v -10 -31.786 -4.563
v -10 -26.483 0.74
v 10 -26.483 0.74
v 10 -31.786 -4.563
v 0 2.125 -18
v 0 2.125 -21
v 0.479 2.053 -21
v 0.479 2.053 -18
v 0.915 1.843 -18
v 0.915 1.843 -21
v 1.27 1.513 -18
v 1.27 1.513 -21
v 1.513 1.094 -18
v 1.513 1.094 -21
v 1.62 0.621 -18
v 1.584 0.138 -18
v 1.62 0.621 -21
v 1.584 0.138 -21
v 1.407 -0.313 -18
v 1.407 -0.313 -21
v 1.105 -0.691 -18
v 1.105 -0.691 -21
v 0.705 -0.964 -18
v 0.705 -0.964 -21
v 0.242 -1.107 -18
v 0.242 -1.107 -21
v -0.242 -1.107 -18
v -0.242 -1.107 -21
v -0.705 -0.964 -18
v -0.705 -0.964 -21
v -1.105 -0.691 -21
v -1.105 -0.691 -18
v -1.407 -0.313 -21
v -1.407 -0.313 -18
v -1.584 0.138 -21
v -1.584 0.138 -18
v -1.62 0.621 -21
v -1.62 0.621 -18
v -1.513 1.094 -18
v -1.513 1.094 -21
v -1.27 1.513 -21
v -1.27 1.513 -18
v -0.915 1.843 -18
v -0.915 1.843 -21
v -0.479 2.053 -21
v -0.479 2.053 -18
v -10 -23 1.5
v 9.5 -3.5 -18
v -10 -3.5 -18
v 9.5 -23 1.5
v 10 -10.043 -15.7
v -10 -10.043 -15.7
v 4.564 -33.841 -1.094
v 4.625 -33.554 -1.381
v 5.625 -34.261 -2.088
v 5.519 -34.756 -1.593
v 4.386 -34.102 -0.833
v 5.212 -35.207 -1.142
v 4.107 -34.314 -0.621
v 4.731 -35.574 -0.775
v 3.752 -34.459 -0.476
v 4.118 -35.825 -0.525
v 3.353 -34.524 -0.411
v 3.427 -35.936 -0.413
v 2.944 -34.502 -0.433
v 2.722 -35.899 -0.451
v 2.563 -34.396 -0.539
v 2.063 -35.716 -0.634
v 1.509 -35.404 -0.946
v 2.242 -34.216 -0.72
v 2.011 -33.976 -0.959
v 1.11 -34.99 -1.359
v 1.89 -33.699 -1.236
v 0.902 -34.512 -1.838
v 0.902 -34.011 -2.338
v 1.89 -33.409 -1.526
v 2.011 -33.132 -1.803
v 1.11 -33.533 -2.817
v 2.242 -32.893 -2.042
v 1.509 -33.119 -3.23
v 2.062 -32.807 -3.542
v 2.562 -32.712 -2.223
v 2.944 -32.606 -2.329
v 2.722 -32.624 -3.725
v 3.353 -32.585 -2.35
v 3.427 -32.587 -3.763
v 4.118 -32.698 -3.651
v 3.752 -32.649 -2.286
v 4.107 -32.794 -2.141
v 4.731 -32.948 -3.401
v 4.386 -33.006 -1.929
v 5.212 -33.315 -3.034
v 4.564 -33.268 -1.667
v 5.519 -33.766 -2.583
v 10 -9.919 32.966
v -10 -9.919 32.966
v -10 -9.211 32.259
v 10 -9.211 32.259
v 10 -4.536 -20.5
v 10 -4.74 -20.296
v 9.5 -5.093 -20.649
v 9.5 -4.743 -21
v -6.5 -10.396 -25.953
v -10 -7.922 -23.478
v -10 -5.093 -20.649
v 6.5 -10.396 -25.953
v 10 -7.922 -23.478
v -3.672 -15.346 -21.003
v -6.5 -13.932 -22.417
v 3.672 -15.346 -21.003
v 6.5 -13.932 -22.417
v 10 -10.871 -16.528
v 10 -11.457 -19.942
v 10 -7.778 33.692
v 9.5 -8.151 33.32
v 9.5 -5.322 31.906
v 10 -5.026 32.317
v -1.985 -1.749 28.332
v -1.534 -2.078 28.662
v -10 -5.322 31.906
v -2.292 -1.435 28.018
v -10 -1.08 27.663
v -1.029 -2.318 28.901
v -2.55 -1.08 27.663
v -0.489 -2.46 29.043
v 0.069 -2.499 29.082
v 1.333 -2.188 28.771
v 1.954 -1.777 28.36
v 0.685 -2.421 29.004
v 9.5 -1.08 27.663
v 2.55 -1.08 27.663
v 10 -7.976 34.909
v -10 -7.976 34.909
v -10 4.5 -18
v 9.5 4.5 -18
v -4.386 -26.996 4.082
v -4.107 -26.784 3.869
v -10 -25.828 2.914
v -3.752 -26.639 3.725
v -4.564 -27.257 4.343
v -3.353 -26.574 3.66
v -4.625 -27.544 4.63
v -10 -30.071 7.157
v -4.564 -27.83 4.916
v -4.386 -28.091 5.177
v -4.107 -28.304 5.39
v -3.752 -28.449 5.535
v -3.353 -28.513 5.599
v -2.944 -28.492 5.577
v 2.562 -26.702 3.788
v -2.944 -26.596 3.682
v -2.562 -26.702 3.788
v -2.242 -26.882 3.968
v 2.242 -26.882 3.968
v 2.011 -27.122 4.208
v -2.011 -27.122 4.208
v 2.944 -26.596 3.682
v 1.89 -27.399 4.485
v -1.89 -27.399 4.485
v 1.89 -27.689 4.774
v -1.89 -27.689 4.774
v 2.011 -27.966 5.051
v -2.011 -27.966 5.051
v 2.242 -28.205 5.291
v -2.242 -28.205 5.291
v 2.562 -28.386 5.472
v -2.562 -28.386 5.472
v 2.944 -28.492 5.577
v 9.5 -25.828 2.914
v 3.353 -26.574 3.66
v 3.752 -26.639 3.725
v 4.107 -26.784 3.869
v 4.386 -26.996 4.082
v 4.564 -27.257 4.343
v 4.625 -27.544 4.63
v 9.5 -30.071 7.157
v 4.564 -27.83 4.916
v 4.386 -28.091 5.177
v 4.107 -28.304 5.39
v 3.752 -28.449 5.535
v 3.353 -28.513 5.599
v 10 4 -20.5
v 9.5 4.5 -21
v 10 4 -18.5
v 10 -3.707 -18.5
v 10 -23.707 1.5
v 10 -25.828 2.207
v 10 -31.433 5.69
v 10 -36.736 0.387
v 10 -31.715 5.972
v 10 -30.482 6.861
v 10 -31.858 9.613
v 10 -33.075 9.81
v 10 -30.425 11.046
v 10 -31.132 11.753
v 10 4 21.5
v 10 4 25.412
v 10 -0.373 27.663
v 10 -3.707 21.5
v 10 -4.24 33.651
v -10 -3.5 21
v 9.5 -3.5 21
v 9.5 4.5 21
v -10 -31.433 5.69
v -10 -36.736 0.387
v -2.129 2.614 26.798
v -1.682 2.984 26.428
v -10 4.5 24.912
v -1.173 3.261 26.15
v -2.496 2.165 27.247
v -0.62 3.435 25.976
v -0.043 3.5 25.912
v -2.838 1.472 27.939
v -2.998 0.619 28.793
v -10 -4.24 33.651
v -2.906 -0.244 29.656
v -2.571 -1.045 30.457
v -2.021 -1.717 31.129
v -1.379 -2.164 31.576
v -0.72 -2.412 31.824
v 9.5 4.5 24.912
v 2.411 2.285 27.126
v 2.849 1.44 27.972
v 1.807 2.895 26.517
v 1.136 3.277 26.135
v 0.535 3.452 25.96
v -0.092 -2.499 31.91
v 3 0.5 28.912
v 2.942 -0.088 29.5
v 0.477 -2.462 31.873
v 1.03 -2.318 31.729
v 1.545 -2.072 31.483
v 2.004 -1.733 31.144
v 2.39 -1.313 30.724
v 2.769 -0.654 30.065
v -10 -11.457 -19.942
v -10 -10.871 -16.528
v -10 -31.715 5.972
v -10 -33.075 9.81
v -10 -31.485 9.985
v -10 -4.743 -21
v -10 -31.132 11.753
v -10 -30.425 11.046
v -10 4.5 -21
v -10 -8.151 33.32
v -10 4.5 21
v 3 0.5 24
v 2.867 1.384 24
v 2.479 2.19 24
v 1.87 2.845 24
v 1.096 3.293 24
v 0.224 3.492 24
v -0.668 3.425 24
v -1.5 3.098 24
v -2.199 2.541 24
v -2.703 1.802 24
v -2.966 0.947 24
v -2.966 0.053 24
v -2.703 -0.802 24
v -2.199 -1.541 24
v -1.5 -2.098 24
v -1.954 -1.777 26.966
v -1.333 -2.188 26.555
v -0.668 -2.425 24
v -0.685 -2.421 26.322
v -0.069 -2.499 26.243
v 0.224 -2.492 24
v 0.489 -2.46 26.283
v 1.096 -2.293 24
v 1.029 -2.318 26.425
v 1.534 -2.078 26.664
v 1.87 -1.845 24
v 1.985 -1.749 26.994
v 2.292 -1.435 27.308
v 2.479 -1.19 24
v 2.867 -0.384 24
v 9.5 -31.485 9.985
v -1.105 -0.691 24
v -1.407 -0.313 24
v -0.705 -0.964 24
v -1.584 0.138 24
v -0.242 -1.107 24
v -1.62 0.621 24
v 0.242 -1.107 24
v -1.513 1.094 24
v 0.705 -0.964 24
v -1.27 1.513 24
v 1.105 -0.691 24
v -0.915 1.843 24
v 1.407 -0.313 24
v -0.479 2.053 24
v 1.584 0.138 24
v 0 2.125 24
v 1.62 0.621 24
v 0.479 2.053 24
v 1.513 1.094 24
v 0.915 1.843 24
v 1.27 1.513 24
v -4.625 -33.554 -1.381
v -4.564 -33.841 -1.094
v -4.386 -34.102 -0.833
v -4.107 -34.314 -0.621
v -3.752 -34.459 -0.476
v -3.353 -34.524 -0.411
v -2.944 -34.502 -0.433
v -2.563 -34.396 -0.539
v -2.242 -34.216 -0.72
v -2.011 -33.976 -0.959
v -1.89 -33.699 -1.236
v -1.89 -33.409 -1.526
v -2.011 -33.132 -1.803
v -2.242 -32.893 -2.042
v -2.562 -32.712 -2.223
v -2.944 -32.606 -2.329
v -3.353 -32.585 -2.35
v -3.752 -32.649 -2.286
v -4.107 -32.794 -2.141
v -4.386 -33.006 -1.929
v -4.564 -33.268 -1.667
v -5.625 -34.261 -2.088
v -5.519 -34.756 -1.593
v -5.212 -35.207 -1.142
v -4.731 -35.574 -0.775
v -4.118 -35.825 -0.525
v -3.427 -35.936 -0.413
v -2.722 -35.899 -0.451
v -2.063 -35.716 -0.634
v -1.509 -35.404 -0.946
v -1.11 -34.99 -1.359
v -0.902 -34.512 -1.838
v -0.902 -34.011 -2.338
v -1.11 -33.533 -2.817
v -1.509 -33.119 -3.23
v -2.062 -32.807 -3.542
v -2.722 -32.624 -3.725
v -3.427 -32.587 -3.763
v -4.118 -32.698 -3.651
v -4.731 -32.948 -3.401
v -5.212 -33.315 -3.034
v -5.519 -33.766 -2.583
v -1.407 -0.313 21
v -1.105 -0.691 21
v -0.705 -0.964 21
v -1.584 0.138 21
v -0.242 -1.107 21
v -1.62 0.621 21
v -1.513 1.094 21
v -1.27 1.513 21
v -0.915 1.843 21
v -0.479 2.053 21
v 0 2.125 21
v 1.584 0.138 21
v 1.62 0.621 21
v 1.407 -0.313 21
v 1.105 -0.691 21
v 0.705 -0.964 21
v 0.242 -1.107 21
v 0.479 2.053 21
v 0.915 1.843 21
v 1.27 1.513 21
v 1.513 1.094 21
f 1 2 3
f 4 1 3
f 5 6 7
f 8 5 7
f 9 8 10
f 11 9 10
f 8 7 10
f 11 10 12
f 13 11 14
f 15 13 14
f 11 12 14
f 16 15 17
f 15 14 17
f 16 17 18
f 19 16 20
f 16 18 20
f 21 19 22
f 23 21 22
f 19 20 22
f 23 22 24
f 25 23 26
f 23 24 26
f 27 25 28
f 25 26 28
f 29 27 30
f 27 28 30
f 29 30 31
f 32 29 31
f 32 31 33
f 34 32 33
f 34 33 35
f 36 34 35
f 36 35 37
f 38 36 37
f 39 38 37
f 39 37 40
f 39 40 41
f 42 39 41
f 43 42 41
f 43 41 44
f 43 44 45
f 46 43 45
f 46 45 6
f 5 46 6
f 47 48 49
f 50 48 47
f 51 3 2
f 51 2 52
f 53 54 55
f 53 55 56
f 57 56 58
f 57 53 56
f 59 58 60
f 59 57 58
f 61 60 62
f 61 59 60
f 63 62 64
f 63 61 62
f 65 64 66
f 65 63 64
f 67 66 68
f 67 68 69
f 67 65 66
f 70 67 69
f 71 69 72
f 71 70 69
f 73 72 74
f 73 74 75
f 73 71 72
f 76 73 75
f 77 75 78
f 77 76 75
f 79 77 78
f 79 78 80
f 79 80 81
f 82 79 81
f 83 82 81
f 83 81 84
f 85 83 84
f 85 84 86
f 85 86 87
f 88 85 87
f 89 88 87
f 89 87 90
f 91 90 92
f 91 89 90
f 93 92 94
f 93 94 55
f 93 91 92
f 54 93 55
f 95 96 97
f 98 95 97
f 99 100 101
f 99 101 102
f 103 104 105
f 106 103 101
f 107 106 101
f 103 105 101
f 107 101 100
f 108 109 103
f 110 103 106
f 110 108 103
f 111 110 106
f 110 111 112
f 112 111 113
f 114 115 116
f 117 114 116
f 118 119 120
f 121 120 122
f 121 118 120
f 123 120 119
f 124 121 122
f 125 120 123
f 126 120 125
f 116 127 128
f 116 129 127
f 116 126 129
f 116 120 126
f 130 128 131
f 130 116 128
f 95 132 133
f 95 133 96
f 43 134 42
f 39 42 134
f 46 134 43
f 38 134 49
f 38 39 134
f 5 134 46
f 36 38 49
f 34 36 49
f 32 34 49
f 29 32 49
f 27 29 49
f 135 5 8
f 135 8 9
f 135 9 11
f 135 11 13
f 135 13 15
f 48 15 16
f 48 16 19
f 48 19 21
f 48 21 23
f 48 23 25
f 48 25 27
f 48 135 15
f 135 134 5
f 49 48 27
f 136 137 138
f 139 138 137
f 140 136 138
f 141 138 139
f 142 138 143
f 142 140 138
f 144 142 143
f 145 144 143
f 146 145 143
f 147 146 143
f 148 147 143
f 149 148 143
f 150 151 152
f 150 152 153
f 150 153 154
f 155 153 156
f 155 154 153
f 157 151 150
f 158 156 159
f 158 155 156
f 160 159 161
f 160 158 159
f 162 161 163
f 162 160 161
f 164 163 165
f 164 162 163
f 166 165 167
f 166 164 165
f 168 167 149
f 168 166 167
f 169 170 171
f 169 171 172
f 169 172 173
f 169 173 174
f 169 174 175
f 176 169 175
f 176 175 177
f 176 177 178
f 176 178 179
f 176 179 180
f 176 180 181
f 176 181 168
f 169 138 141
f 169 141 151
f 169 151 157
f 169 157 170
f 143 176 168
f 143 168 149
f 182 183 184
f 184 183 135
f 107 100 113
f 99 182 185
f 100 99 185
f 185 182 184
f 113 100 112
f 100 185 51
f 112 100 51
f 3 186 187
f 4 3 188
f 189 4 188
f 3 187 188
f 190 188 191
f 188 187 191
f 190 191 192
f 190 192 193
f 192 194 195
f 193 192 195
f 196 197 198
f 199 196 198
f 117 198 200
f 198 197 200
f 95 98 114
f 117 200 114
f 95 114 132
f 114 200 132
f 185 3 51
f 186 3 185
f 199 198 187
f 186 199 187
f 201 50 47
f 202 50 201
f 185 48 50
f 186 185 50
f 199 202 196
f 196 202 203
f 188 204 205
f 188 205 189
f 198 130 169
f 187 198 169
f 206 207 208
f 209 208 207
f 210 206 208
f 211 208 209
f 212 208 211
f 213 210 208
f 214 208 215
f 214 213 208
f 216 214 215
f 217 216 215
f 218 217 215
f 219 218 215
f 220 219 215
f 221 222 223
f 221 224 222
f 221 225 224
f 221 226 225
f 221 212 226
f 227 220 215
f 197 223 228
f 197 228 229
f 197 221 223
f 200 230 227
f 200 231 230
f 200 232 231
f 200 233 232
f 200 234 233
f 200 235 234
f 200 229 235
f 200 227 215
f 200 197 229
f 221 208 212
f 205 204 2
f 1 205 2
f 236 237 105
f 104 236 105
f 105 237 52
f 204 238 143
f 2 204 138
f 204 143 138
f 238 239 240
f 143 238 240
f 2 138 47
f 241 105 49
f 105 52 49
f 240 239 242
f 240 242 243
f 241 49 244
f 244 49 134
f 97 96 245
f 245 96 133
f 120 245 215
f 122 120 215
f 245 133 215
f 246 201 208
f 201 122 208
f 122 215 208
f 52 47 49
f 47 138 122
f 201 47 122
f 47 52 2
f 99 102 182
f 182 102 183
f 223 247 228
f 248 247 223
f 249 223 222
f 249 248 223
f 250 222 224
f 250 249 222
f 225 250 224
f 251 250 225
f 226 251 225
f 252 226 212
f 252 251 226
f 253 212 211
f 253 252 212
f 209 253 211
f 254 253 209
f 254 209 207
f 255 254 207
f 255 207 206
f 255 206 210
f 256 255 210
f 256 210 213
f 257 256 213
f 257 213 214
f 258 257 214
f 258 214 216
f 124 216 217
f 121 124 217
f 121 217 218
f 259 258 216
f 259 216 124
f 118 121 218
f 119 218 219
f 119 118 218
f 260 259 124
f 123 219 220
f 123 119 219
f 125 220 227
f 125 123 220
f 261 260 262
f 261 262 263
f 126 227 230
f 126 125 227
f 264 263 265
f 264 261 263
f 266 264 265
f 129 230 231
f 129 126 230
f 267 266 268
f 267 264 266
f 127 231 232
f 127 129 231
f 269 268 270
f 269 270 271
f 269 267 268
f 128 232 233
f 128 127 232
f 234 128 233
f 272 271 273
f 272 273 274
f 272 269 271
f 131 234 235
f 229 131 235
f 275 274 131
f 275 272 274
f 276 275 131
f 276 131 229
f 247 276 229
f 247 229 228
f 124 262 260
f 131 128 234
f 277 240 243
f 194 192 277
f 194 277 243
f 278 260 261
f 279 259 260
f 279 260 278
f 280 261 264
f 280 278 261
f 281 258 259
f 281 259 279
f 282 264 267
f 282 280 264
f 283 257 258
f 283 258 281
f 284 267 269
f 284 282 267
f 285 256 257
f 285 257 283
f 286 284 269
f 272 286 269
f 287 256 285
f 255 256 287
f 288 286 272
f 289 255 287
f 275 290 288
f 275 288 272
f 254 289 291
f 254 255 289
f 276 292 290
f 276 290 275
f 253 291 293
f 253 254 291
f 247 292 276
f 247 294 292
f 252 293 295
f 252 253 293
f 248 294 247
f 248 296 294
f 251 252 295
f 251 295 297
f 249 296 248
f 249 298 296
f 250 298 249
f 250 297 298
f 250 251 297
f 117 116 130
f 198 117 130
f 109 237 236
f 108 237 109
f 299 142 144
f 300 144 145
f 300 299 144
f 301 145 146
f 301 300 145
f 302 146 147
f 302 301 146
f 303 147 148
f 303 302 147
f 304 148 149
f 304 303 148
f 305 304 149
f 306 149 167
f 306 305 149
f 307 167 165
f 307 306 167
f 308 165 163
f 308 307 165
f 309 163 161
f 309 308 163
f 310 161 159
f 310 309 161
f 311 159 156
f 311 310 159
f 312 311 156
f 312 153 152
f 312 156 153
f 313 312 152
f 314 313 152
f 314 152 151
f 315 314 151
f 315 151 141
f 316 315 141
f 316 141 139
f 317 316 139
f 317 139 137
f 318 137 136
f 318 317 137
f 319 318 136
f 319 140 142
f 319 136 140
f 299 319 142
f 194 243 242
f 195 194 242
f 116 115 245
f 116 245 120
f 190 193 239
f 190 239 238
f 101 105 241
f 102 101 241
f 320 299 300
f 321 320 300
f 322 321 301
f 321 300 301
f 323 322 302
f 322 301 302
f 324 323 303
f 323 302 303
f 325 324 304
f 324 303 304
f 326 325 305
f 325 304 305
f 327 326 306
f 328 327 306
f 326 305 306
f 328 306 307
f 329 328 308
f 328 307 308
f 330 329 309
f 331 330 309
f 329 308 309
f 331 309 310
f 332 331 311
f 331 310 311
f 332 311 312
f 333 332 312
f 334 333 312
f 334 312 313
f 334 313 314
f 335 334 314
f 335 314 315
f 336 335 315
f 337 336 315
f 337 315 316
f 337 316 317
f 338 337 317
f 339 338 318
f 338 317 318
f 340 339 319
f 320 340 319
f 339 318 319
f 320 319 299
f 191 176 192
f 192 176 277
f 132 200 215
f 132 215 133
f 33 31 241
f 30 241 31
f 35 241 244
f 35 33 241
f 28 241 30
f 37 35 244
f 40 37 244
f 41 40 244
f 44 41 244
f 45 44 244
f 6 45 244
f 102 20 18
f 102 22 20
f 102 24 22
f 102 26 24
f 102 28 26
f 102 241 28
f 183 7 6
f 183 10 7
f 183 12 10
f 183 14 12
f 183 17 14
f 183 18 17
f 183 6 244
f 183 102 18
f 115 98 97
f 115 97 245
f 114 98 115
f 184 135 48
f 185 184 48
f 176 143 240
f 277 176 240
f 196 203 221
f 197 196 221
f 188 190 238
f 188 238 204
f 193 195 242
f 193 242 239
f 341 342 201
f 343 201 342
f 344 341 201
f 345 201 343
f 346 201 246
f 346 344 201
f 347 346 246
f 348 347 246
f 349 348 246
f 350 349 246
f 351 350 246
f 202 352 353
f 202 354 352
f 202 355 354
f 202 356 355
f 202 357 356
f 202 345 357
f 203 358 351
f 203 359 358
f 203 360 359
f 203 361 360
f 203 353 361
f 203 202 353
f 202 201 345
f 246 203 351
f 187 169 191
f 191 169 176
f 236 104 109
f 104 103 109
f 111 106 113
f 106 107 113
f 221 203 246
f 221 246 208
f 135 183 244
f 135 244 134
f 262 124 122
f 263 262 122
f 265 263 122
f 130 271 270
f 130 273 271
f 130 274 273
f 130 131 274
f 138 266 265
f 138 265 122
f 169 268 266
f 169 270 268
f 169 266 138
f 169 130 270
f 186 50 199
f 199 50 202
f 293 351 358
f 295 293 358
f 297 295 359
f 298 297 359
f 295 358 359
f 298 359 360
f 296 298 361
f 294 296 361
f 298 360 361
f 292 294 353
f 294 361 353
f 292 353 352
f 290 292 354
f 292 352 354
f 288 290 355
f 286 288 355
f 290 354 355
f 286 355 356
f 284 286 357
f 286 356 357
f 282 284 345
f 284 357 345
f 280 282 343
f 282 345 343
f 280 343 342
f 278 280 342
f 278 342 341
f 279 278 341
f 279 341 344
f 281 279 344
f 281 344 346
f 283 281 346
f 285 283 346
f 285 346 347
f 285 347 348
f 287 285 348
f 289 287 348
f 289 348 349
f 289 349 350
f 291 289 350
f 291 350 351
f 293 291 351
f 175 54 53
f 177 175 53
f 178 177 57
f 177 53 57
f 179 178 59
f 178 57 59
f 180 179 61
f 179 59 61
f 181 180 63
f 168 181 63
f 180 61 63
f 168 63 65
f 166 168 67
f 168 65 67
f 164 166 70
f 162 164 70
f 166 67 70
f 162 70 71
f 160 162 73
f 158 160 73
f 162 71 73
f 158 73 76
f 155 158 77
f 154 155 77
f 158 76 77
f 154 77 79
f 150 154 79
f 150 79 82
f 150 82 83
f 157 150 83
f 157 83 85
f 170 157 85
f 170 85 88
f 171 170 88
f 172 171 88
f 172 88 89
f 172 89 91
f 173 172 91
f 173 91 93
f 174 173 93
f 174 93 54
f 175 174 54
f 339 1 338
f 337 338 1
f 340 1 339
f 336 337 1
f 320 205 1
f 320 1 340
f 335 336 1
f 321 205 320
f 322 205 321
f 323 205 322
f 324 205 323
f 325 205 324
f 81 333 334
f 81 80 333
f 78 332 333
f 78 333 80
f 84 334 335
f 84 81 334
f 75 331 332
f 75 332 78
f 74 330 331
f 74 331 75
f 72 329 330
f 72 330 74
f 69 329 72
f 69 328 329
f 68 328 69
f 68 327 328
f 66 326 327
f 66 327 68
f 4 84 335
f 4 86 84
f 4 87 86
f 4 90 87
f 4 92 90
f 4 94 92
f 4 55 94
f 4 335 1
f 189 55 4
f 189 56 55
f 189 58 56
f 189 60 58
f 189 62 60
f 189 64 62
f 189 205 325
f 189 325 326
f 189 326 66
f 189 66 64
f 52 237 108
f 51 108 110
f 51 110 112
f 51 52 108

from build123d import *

# Parameters (mm, degrees)
CYLINDER003_R     = 3
CYLINDER003_DEPTH = 10
PAD008_DEPTH      = 10
SKETCH032_R       = 1.625
POCKET023_DEPTH   = 55.910244
SKETCH033_W       = 20
SKETCH033_H       = 7
PAD009_DEPTH      = 7.5
SKETCH034_R       = 1.375
POCKET024_DEPTH   = 12
CHAMFER020_1_SIZE = 3.5
CHAMFER020_2_SIZE = 1
CHAMFER021_SIZE   = 0.5
CHAMFER022_SIZE   = 2


with BuildPart() as boardbracketscrewheadcylinder:
    # Cylinder003 → Cylinder003 (new body)
    with BuildSketch(Plane(origin=(0, 0.5, 24), x_dir=(1, 0, 0), z_dir=(0, 0, 1))):
        Circle(CYLINDER003_R)
    extrude(amount=CYLINDER003_DEPTH)


with BuildPart() as boardbracketpinschamfer022_final:
    # Sketch031 → Pad008 (new body, symmetric)
    with BuildSketch(Plane.YZ):
        Polygon((4.5, 21), (4.5, 24.911688), (-4.23971, 33.651398), (-7.975533, 34.909244), (-9.918525, 32.966252), (-9.211418, 32.259145), (-8.150758, 33.319805), (-5.32233, 31.905592), (-1.07969, 27.662951), (-25.828427, 2.914214), (-30.071068, 7.156854), (-31.485281, 9.985281), (-30.424621, 11.045942), (-31.131728, 11.753048), (-33.07472, 9.810056), (-31.714777, 5.972136), (-4.742641, -21), (4.5, -21), (4.5, -18), (-3.5, -18), (-23, 1.5), (-3.5, 21), align=None)
    extrude(amount=PAD008_DEPTH, both=True)

    # Sketch032 → Pocket023 (cut, through all)
    with BuildSketch(Plane.YX.offset(21)):
        with Locations((0.5, 0)):
            Circle(SKETCH032_R)
    extrude(amount=-POCKET023_DEPTH, mode=Mode.SUBTRACT)

    # Cut001: cut BoardBracketScrewHeadCylinder
    add(boardbracketscrewheadcylinder.part, mode=Mode.SUBTRACT)

    # Sketch033 → Pad009 (new body)
    with BuildSketch(Plane(origin=(0, -12.87132, -12.87132), x_dir=(1, 0, 0), z_dir=(0, -0.707107, -0.707107))):
        with Locations((0, 22.75)):
            Rectangle(SKETCH033_W, SKETCH033_H)
        with Locations((0, -7.5)):
            Rectangle(SKETCH033_W, SKETCH033_H)
    extrude(amount=PAD009_DEPTH)

    # Sketch034 → Pocket024 (cut)
    with BuildSketch(Plane(origin=(0, -18.174621, -18.174621), x_dir=(1, 0, 0), z_dir=(0, -0.707107, -0.707107))):
        with Locations((3.25, 22.75)):
            Circle(SKETCH034_R)
    pocket024 = extrude(amount=-POCKET024_DEPTH, mode=Mode.SUBTRACT)

    # Mirrored002: Pocket024 across Sketch034 V_Axis
    add(pocket024.mirror(Plane(origin=(0, -18.174621, -18.174621), x_dir=(0, -0.707107, -0.707107), z_dir=(1, 0, 0))), mode=Mode.SUBTRACT)

    # Chamfer020 1
    chamfer020_1_edges = [boardbracketpinschamfer022_final.edges().sort_by_distance(p)[0] for p in [
        (-10, -12.87132, -23.477922),
        (10, -12.87132, -23.477922),
    ]]
    chamfer(chamfer020_1_edges, length=CHAMFER020_1_SIZE)

    # Chamfer020 2
    chamfer020_2_edges = [boardbracketpinschamfer022_final.edges().sort_by_distance(p)[0] for p in [
        (-1.875, -34.2613, -2.087942),
        (1.875, -34.2613, -2.087942),
    ]]
    chamfer(chamfer020_2_edges, length=CHAMFER020_2_SIZE)

    # Chamfer021
    chamfer021_edges = [boardbracketpinschamfer022_final.edges().sort_by_distance(p)[0] for p in [
        (10, -4.917893, -20.824747),
        (10, -0.12132, -21),
        (10, 4.5, -19.5),
        (10, 0.5, -18),
        (10, -13.25, -8.25),
        (10, -13.25, 11.25),
        (10, 0.5, 21),
        (10, 4.5, 22.955844),
        (10, -30.778175, 8.571068),
        (10, -27.949747, 5.035534),
        (10, -13.454058, 15.288582),
        (10, -3.20101, 29.784271),
        (10, -6.736544, 32.612698),
    ]]
    chamfer(chamfer021_edges, length=CHAMFER021_SIZE)

    # Chamfer022
    chamfer022_edges = [boardbracketpinschamfer022_final.edges().sort_by_distance(p)[0] for p in [
        (8.25, -14.108757, -19.765611),
        (-8.25, -14.108757, -19.765611),
    ]]
    chamfer(chamfer022_edges, length=CHAMFER022_SIZE)


solid = boardbracketpinschamfer022_final.part
